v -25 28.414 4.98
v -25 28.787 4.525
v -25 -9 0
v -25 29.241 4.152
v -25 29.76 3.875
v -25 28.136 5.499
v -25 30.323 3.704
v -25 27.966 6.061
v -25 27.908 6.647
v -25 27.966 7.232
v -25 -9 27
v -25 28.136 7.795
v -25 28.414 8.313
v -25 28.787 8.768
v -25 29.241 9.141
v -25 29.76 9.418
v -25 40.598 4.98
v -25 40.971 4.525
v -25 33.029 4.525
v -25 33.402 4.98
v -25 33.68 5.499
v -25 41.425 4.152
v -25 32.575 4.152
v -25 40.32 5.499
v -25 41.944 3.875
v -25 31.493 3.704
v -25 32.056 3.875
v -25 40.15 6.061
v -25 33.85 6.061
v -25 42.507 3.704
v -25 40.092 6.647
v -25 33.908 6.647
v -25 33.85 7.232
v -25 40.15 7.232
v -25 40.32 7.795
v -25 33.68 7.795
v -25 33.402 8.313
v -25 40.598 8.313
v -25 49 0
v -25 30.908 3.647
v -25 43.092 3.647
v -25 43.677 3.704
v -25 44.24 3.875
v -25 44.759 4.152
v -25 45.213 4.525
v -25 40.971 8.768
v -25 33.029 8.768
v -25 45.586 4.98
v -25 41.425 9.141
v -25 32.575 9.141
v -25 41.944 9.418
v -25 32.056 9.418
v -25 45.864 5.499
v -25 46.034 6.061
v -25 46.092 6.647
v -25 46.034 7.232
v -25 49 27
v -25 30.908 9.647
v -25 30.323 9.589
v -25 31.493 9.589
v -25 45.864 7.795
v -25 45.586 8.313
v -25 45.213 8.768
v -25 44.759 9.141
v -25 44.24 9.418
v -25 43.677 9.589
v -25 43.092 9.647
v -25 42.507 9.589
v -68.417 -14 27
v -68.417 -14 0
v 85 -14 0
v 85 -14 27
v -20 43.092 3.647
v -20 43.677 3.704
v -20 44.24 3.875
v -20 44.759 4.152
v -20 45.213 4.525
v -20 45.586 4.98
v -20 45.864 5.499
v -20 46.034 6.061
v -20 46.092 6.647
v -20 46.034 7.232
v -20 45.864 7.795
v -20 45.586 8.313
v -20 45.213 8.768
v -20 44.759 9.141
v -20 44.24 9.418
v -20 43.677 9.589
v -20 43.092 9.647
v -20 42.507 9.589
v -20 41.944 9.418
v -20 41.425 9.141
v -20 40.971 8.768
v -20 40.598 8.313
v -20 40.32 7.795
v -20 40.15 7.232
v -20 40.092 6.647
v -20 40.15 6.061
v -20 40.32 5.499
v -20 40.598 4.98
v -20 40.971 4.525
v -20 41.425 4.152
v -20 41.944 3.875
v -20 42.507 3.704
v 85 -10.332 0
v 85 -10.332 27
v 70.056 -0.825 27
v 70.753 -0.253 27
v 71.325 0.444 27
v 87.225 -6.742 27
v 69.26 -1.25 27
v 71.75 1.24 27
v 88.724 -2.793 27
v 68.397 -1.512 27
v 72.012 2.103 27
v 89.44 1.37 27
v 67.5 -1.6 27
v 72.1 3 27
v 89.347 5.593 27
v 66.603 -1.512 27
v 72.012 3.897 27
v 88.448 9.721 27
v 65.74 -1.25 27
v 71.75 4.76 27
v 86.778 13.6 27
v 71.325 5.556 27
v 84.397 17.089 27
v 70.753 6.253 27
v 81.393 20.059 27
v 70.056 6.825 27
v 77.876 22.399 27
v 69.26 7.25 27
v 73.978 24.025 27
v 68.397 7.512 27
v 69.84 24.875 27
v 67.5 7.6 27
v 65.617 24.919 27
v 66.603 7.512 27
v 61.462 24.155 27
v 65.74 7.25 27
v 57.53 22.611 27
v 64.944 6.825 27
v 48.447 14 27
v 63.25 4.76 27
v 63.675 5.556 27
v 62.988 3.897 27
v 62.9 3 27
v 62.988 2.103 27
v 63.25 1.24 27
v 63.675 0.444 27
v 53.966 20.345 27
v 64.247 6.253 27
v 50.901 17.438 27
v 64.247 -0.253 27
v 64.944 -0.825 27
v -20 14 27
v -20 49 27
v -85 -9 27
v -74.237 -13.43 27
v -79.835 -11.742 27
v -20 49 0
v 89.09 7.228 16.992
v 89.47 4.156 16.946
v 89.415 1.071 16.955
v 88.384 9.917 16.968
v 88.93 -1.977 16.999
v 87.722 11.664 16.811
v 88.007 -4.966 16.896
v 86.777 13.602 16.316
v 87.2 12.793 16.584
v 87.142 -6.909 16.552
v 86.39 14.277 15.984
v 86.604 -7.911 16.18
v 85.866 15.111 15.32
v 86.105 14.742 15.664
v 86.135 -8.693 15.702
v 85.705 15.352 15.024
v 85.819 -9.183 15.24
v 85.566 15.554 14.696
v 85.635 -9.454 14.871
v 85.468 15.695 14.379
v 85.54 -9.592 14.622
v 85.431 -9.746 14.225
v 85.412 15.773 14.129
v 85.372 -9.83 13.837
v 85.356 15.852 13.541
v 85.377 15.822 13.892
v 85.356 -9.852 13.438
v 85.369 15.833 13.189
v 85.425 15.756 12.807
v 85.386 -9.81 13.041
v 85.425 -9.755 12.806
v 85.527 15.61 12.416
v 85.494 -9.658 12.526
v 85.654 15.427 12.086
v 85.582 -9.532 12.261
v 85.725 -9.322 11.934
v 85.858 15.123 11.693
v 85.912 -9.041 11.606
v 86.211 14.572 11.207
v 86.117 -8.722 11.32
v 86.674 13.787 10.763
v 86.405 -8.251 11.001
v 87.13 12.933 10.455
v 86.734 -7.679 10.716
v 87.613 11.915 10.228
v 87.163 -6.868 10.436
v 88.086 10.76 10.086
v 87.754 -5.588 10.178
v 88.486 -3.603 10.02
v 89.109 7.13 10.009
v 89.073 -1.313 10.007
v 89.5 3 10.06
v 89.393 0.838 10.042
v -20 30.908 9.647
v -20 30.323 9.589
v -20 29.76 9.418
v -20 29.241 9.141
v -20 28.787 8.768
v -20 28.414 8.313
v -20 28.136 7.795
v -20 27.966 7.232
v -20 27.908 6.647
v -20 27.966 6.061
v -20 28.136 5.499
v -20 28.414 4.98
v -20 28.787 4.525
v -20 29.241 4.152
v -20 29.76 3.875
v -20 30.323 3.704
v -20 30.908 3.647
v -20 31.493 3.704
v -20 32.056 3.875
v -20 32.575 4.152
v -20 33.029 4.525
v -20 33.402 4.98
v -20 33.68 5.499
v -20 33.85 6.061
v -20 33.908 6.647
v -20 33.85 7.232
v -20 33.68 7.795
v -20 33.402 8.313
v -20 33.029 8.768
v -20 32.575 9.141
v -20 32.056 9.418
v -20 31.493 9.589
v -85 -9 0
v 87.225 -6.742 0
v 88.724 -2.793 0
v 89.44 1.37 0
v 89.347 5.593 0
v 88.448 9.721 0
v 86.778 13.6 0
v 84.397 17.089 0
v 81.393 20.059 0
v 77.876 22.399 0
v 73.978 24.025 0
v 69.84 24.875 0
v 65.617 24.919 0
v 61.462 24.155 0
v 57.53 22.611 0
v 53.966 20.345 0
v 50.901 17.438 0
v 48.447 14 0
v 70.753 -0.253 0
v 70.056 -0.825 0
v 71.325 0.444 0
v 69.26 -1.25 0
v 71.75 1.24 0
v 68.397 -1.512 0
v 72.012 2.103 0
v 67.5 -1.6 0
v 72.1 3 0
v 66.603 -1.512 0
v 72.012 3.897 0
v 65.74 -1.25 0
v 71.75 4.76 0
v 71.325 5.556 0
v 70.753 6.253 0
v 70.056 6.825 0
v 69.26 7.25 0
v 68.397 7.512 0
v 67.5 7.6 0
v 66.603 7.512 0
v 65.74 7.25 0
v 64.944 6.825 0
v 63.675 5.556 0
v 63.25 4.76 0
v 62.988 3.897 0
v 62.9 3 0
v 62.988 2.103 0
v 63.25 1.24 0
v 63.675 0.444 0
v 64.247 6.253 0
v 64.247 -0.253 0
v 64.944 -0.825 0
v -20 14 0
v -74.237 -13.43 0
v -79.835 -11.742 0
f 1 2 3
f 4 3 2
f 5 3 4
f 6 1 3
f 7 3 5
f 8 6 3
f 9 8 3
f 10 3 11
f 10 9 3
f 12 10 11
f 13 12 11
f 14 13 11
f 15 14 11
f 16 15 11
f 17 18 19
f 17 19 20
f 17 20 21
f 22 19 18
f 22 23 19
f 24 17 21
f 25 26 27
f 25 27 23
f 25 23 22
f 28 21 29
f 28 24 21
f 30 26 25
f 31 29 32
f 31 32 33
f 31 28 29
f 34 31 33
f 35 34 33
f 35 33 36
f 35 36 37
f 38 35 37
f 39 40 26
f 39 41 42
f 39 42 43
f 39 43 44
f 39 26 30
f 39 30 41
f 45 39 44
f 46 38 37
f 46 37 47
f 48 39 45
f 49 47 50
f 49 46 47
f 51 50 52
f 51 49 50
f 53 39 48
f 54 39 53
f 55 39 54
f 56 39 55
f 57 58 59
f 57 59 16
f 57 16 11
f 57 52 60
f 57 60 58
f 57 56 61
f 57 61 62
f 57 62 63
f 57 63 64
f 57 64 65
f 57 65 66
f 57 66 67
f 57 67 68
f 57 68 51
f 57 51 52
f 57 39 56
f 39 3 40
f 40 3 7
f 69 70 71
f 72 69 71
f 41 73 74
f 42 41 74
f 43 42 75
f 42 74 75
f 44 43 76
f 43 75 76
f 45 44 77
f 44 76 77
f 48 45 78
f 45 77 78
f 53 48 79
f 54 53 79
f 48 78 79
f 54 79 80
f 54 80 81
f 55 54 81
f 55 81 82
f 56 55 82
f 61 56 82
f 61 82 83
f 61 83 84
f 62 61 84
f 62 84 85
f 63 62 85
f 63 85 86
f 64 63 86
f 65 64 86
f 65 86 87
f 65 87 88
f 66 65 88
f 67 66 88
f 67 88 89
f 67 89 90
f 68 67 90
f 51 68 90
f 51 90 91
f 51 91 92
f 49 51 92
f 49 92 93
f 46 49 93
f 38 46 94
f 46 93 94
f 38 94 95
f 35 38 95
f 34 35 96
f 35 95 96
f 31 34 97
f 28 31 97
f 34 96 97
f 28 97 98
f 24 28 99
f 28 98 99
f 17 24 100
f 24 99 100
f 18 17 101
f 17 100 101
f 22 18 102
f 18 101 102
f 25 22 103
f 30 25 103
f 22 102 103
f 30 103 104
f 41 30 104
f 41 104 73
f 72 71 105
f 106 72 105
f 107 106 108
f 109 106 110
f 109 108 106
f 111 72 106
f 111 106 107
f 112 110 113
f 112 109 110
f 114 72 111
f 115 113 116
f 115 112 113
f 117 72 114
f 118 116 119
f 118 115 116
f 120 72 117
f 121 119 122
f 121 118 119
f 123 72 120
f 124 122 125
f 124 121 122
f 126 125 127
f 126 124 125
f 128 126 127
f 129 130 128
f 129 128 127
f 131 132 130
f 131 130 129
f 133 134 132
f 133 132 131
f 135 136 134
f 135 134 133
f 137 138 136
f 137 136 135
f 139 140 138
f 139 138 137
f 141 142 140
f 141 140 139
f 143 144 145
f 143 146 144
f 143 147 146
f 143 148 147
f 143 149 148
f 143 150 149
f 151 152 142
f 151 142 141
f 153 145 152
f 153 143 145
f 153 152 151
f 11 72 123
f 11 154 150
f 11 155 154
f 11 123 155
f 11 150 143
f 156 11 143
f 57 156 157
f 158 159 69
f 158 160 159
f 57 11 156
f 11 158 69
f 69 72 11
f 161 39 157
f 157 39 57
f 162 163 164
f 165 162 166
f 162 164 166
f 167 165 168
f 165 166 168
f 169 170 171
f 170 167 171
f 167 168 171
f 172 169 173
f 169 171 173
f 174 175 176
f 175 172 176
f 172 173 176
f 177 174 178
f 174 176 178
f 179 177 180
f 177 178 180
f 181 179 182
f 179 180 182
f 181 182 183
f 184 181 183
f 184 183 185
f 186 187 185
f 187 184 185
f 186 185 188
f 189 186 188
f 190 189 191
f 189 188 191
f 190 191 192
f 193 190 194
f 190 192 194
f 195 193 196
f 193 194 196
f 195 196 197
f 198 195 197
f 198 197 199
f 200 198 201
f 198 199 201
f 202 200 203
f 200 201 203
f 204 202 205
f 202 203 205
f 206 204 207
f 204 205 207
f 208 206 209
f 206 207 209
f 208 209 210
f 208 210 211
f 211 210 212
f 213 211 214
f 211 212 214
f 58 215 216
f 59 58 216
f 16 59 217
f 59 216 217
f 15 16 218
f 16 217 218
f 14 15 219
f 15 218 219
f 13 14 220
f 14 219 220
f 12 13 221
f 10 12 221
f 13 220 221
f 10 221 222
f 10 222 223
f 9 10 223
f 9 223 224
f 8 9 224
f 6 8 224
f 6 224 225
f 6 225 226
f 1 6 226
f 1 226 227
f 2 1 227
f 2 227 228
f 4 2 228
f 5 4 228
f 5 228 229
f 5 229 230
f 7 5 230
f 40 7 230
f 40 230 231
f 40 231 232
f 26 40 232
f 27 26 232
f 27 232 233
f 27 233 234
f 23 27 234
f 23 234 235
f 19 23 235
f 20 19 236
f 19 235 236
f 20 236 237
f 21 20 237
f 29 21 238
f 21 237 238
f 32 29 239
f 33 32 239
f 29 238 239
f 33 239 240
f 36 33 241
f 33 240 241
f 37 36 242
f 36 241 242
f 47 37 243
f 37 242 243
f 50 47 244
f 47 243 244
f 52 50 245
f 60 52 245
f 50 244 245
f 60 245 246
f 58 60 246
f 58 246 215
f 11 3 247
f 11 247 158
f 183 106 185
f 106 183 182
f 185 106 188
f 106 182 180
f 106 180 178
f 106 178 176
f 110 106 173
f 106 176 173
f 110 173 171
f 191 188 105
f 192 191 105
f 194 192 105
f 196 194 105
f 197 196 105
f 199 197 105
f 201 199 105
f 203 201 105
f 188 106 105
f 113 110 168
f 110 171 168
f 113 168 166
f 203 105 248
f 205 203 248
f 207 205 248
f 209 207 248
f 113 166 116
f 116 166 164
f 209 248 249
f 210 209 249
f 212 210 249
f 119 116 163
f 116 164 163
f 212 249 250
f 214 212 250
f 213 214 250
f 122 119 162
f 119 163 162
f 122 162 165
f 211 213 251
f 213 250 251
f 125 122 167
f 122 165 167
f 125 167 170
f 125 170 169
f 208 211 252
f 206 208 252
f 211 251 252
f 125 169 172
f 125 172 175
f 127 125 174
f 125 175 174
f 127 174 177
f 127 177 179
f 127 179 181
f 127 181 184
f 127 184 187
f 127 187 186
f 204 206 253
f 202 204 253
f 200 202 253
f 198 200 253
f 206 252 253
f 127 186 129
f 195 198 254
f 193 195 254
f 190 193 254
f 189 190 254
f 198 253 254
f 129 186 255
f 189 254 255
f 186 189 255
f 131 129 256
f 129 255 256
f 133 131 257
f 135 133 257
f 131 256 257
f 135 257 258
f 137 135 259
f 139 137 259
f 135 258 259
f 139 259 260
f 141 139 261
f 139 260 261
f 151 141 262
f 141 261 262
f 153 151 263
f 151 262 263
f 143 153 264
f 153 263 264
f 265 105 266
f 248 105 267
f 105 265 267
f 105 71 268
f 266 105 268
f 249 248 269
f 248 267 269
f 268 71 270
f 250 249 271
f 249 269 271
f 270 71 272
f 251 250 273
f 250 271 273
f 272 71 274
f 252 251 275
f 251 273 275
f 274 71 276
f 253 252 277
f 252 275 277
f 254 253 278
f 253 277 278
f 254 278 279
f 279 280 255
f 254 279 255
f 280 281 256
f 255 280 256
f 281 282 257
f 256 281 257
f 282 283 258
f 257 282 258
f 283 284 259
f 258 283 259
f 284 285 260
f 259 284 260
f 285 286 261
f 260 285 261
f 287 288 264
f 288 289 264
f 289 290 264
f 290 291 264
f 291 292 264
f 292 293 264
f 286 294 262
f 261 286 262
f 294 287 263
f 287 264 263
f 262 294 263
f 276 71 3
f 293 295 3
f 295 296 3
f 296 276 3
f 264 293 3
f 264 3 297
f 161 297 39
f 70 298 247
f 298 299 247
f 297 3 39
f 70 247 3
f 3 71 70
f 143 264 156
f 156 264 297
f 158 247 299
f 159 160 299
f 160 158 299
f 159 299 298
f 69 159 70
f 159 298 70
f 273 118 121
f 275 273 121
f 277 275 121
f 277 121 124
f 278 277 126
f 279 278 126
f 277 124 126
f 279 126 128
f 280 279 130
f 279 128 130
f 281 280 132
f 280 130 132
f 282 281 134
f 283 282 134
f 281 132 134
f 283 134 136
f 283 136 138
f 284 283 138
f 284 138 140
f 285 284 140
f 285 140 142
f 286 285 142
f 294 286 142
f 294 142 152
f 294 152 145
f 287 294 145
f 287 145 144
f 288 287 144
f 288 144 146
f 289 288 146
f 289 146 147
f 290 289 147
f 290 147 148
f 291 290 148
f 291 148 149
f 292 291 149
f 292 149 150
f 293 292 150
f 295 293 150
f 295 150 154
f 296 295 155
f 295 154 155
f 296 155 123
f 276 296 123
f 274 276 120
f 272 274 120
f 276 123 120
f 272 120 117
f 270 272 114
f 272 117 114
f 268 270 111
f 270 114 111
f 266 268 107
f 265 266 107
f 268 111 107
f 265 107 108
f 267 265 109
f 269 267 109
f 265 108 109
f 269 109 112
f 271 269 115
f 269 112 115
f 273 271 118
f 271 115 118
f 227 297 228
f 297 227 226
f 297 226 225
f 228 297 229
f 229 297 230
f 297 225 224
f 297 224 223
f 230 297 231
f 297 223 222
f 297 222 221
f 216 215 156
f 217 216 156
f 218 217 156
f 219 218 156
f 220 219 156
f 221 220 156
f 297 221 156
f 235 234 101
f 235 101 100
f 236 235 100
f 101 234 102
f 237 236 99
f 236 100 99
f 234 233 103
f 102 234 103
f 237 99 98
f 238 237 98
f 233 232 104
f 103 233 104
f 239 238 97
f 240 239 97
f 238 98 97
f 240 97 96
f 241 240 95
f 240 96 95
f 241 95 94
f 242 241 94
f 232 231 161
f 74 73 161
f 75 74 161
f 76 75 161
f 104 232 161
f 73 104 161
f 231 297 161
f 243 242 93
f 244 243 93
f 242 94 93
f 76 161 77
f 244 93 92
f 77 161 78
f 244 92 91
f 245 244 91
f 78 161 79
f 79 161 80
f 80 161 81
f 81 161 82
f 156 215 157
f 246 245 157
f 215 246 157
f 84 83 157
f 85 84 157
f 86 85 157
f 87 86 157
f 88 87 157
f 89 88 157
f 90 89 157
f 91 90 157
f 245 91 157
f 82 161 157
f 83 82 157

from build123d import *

# Parameters (mm, degrees)
RESSALTO_EXTRUS_O2_DEPTH = 27
ESBO_O2_R                = 4.6
CORTE_EXTRUS_O1_DEPTH    = 35
CORTE_EXTRUS_O3_DEPTH    = 60
ESBO_O7_W                = 27
ESBO_O7_H                = 35
RESSALTO_EXTRUS_O3_DEPTH = 5
ESBO_O8_R                = 3
CORTE_EXTRUS_O4_DEPTH    = 123.96442575
FILETE1_R                = 30
ESBO_O12_R               = 3.5
CORTE_EXTRUS_O5_DEPTH    = 113.730874209


with BuildPart() as part:
    # Esboço1 → Ressalto-extrusão2 (new body)
    with BuildSketch(Plane.XY):
        with BuildLine():
            Line((-85, -14), (85, -14))
            Line((85, -14), (85, -10.332291626))
            ThreePointArc((85, -10.332291626), (79.690886502, 21.313445506), (48.447441117, 14))
            Line((48.447441117, 14), (-85, 14))
            Line((-85, 14), (-85, -14))
        make_face()
    extrude(amount=RESSALTO_EXTRUS_O2_DEPTH)

    # Esboço2 → Corte-extrusão1 (cut)
    with BuildSketch(Plane.XY.offset(27)):
        with Locations((67.5, 3)):
            Circle(ESBO_O2_R)
    extrude(amount=-CORTE_EXTRUS_O1_DEPTH, mode=Mode.SUBTRACT)

    # Esboço6 → Corte-extrusão3 (cut)
    with BuildSketch(Plane.ZY.offset(85)):
        Polygon((5, -9), (22, -9), (27, -9), (27, 14), (0, 14), (0, -9), align=None)
    extrude(amount=-CORTE_EXTRUS_O3_DEPTH, mode=Mode.SUBTRACT)

    # Esboço7 → Ressalto-extrusão3 (add)
    with BuildSketch(Plane.ZY.offset(25)):
        with Locations((13.5, 31.5)):
            Rectangle(ESBO_O7_W, ESBO_O7_H)
    extrude(amount=-RESSALTO_EXTRUS_O3_DEPTH)

    # Esboço8 → Corte-extrusão4 (cut, through all)
    with BuildSketch(Plane(origin=(-20, 0, 0), x_dir=(0, 0, -1), z_dir=(1, 0, 0))):
        with Locations((-6.646583991, 43.091925341)):
            Circle(ESBO_O8_R)
        with Locations(Location((-6.646583991, 30.908074659, 0), (0, 0, 180))):
            Circle(ESBO_O8_R)
    extrude(amount=-CORTE_EXTRUS_O4_DEPTH, mode=Mode.SUBTRACT)

    # Filete1
    # the kernel refuses this fillet: 30 mm, written as the material it takes off along each edge
    with BuildSketch(Plane(origin=(-85, -14, -41.457809879), x_dir=(0, 1, 0), z_dir=(0, 0, 1))) as filete1_piece_1:
        with BuildLine():
            CenterArc((30, -16.583123952), FILETE1_R, 146.442690238, 33.557309762)
            Line((0, -16.583123952), (-0.6, -16.583123952))
            Line((-0.6, -16.583123952), (-0.6, 0))
            Line((-0.6, 0), (0, 0.6))
            ThreePointArc((0, 0.6), (2.5, 0.6), (4.5, 0.331662479))
            Line((4.5, 0.331662479), (5, 0))
        make_face()
    extrude(amount=109.915619759, mode=Mode.SUBTRACT)

    # Esboço12 → Corte-extrusão5 (cut, through all)
    with BuildSketch(Plane.XZ.offset(14)):
        with Locations((88.855428665, 13.5)):
            Circle(ESBO_O12_R)
    extrude(amount=-CORTE_EXTRUS_O5_DEPTH, mode=Mode.SUBTRACT)


solid = part.part
